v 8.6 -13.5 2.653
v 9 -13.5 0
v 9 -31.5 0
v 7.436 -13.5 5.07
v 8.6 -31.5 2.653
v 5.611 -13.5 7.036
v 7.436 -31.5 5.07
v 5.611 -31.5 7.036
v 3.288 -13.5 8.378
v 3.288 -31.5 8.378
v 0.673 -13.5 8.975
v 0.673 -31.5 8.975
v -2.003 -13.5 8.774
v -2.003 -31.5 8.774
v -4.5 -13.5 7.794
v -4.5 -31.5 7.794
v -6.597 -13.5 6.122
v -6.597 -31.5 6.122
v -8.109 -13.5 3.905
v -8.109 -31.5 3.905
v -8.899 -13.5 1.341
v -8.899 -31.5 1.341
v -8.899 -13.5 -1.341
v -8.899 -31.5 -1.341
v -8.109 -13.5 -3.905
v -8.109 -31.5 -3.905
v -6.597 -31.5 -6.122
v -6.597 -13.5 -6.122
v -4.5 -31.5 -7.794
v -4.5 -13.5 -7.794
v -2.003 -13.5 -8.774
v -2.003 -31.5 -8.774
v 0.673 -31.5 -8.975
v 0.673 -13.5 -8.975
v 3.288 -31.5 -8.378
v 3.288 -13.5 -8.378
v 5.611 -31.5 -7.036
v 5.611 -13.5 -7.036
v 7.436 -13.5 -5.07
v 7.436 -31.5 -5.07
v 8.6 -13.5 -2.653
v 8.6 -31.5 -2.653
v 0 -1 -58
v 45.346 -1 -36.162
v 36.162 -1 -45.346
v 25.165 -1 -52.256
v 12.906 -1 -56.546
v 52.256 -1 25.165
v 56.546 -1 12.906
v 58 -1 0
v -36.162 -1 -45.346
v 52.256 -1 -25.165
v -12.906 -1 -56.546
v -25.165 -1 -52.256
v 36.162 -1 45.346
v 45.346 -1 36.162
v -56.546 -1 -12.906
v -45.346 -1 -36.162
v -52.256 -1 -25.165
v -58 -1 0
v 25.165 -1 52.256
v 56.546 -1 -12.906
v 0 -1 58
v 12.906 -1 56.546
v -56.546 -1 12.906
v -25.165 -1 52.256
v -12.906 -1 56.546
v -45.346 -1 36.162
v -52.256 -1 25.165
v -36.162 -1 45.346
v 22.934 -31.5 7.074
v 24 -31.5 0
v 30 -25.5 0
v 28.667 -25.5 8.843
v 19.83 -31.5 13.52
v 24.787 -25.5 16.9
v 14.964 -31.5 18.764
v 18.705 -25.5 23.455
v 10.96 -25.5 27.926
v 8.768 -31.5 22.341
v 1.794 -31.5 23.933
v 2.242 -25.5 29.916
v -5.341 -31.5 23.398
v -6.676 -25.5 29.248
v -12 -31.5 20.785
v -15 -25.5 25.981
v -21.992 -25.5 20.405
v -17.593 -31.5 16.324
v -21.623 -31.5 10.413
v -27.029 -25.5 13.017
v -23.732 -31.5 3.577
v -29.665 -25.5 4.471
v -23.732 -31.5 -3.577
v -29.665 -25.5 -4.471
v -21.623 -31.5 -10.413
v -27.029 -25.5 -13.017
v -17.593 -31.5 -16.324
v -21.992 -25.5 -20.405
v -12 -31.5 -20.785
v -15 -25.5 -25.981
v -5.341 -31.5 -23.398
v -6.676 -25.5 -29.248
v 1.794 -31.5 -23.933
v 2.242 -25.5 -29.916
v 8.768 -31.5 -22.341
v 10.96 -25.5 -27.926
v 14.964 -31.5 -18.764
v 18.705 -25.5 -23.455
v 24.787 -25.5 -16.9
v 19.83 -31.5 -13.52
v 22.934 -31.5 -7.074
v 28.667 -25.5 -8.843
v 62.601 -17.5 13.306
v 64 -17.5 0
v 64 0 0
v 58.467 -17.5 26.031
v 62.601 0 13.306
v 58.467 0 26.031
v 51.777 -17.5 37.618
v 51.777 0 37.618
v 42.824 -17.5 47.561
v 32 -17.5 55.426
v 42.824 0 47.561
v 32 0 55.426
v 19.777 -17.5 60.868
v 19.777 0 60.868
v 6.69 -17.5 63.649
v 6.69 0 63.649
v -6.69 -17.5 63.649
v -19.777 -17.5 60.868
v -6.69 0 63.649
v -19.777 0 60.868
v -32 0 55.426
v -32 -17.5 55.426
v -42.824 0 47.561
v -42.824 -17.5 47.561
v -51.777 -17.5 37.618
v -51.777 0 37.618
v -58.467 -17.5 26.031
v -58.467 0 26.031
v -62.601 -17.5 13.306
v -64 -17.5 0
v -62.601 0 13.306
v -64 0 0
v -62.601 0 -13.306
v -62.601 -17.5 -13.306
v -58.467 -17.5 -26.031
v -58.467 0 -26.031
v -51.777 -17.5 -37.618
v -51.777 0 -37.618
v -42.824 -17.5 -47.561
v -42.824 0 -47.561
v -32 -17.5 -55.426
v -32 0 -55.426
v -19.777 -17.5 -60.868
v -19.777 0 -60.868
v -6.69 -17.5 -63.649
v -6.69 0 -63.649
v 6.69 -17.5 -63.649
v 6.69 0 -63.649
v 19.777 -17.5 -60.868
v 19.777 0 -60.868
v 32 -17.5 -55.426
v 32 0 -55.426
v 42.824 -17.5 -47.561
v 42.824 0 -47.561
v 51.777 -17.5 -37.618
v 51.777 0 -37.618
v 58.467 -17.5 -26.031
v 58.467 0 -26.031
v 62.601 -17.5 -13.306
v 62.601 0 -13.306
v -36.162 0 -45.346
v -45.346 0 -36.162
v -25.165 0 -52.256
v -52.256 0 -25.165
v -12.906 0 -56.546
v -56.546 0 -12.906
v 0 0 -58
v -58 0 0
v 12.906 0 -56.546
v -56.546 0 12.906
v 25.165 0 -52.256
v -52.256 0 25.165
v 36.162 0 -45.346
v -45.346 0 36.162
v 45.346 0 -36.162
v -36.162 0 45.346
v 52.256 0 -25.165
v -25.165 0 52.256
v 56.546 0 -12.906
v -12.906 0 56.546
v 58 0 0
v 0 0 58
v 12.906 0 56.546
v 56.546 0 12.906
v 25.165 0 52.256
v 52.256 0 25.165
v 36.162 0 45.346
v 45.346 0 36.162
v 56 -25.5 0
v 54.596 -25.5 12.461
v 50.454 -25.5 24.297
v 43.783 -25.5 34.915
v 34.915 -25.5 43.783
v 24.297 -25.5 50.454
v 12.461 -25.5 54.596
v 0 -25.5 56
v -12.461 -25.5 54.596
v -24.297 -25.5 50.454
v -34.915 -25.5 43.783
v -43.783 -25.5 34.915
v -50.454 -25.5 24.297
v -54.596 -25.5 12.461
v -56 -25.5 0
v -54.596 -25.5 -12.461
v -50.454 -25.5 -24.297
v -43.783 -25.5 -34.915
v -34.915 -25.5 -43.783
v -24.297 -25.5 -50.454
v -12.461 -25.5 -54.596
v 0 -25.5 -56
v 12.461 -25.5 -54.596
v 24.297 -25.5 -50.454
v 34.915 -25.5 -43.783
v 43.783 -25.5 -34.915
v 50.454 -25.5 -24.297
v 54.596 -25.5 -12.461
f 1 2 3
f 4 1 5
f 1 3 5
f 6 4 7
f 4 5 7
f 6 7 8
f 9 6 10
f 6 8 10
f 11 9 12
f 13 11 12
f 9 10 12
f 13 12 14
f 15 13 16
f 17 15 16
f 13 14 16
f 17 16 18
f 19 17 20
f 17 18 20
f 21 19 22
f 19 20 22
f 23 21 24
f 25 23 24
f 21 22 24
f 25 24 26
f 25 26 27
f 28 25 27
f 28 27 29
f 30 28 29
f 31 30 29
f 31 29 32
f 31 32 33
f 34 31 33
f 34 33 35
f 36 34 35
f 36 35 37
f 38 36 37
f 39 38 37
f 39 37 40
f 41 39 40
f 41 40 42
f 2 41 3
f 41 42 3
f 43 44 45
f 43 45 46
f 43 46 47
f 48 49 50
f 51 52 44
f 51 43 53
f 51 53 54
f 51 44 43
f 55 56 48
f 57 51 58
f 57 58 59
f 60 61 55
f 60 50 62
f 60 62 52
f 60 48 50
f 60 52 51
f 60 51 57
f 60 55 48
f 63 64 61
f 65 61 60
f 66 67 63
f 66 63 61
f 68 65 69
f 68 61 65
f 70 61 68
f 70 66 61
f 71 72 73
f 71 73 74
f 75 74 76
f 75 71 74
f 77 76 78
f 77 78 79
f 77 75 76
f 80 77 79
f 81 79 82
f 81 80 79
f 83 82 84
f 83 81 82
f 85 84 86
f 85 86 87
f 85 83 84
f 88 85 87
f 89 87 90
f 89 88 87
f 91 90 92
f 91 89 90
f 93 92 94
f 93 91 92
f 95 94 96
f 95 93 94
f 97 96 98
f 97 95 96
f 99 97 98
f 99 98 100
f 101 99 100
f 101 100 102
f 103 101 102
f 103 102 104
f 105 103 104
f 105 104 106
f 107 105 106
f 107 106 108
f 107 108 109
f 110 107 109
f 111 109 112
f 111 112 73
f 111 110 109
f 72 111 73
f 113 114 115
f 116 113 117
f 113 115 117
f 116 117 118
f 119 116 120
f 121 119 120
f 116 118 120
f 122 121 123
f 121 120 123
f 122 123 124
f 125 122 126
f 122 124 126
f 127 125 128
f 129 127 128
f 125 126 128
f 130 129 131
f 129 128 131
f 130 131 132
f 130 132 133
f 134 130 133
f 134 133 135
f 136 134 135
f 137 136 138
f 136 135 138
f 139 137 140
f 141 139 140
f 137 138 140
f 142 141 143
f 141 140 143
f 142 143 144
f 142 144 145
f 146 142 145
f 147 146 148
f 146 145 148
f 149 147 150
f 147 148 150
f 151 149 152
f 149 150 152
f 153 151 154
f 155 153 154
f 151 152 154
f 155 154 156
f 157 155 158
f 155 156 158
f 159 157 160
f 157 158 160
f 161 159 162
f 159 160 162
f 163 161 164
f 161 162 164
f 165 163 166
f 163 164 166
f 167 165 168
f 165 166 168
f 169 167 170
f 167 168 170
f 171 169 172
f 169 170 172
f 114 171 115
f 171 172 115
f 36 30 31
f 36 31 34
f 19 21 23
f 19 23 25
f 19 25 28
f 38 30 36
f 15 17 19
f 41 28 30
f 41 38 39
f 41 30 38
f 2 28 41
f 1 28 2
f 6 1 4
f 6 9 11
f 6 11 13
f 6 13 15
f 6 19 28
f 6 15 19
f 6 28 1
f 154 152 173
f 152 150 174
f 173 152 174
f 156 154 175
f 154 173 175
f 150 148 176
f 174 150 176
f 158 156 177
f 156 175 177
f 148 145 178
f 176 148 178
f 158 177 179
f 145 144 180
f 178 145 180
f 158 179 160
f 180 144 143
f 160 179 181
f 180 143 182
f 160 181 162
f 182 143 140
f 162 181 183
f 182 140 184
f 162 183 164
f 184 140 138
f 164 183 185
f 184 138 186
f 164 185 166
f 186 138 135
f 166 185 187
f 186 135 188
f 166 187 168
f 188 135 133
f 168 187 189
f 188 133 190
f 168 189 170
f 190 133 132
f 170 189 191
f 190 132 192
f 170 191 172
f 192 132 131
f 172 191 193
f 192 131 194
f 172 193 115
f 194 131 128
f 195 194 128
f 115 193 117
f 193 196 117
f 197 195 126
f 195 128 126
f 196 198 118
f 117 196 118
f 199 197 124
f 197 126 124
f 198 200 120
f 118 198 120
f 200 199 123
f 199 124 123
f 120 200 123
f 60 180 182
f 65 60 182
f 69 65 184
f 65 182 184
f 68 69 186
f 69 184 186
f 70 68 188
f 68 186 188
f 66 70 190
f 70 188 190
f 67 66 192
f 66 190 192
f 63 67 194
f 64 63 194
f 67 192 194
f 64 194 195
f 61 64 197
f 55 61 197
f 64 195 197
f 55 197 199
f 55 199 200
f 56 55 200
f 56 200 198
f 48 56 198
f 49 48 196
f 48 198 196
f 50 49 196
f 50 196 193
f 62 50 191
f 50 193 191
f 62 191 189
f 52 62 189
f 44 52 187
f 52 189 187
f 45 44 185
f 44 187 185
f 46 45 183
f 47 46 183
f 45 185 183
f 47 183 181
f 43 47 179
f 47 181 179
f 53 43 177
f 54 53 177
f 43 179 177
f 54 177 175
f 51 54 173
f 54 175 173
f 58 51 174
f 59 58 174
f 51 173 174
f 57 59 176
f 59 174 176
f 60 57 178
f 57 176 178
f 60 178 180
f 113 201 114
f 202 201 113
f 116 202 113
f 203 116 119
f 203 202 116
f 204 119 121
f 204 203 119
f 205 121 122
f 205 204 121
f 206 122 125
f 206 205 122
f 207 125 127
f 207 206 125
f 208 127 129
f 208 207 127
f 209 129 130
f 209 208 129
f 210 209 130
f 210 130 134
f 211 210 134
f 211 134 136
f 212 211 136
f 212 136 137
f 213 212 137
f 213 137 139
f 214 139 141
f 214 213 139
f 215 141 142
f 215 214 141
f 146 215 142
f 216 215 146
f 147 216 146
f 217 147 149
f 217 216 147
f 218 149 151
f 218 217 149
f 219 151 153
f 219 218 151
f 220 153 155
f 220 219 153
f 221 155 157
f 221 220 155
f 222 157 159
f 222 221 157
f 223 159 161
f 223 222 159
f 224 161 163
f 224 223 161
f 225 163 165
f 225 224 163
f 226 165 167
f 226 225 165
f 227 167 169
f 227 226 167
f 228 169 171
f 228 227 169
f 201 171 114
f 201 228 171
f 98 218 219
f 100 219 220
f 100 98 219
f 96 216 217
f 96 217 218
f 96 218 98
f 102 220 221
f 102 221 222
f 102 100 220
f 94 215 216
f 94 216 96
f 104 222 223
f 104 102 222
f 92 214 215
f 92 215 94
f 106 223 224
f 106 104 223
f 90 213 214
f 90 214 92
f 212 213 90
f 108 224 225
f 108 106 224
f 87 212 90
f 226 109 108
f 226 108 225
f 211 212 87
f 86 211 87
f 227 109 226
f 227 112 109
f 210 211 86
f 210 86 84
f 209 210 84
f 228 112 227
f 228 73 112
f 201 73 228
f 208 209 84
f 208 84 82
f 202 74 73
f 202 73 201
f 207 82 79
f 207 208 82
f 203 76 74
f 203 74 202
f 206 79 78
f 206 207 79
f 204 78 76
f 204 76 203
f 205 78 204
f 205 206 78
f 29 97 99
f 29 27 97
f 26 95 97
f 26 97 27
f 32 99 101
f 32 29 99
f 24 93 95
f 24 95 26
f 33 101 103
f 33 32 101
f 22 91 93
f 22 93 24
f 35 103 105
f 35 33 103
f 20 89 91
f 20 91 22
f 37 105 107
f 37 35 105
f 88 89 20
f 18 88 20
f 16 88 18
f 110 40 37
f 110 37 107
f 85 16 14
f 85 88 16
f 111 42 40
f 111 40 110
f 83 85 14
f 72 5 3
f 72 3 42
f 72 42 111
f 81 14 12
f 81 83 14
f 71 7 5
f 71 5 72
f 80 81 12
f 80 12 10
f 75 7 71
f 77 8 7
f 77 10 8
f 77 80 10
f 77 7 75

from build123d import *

# Parameters (mm, degrees)
F0_R      = 64
F1_DEPTH  = 25.5
F2_R      = 58
F3_DEPTH  = 1
F4_SIZE   = 8
F5_R      = 30
F6_DEPTH  = 6
F7_SIZE   = 5.99999
F9_R      = 9
F10_DEPTH = 18


# Not quite as in the source:
# - a fillet or chamfer is up to 0.001 mm smaller than in the source, because OpenCascade refuses the exact size


with BuildPart() as f1:
    # F0 (on Front) → F1 (new body)
    with BuildSketch(Plane.XZ):
        Circle(F0_R)
    extrude(amount=F1_DEPTH)

    # F2 (on face) → F3 (cut)
    with BuildSketch(Plane(origin=(0, 0, 0), x_dir=(-1, 0, 0), z_dir=(0, 1, 0))):
        Circle(F2_R)
    extrude(amount=-F3_DEPTH, mode=Mode.SUBTRACT)

    # F4
    f4_edges = [f1.edges().sort_by_distance(p)[0] for p in [
        (-64, -25.5, 0),
    ]]
    chamfer(f4_edges, length=F4_SIZE)

    # F5 (on face) → F6 (join)
    with BuildSketch(Plane.XZ.offset(25.5)):
        Circle(F5_R)
    extrude(amount=F6_DEPTH)

    # F7 (size 6 in the source; OpenCascade refuses exactly that, so slightly less here)
    f7_edges = [f1.edges().sort_by_distance(p)[0] for p in [
        (-30, -31.5, 0),
    ]]
    chamfer(f7_edges, length=F7_SIZE)

    # F9 (on face) → F10 (cut)
    with BuildSketch(Plane.XZ.offset(31.5)):
        Circle(F9_R)
    extrude(amount=-F10_DEPTH, mode=Mode.SUBTRACT)


solid = f1.part
